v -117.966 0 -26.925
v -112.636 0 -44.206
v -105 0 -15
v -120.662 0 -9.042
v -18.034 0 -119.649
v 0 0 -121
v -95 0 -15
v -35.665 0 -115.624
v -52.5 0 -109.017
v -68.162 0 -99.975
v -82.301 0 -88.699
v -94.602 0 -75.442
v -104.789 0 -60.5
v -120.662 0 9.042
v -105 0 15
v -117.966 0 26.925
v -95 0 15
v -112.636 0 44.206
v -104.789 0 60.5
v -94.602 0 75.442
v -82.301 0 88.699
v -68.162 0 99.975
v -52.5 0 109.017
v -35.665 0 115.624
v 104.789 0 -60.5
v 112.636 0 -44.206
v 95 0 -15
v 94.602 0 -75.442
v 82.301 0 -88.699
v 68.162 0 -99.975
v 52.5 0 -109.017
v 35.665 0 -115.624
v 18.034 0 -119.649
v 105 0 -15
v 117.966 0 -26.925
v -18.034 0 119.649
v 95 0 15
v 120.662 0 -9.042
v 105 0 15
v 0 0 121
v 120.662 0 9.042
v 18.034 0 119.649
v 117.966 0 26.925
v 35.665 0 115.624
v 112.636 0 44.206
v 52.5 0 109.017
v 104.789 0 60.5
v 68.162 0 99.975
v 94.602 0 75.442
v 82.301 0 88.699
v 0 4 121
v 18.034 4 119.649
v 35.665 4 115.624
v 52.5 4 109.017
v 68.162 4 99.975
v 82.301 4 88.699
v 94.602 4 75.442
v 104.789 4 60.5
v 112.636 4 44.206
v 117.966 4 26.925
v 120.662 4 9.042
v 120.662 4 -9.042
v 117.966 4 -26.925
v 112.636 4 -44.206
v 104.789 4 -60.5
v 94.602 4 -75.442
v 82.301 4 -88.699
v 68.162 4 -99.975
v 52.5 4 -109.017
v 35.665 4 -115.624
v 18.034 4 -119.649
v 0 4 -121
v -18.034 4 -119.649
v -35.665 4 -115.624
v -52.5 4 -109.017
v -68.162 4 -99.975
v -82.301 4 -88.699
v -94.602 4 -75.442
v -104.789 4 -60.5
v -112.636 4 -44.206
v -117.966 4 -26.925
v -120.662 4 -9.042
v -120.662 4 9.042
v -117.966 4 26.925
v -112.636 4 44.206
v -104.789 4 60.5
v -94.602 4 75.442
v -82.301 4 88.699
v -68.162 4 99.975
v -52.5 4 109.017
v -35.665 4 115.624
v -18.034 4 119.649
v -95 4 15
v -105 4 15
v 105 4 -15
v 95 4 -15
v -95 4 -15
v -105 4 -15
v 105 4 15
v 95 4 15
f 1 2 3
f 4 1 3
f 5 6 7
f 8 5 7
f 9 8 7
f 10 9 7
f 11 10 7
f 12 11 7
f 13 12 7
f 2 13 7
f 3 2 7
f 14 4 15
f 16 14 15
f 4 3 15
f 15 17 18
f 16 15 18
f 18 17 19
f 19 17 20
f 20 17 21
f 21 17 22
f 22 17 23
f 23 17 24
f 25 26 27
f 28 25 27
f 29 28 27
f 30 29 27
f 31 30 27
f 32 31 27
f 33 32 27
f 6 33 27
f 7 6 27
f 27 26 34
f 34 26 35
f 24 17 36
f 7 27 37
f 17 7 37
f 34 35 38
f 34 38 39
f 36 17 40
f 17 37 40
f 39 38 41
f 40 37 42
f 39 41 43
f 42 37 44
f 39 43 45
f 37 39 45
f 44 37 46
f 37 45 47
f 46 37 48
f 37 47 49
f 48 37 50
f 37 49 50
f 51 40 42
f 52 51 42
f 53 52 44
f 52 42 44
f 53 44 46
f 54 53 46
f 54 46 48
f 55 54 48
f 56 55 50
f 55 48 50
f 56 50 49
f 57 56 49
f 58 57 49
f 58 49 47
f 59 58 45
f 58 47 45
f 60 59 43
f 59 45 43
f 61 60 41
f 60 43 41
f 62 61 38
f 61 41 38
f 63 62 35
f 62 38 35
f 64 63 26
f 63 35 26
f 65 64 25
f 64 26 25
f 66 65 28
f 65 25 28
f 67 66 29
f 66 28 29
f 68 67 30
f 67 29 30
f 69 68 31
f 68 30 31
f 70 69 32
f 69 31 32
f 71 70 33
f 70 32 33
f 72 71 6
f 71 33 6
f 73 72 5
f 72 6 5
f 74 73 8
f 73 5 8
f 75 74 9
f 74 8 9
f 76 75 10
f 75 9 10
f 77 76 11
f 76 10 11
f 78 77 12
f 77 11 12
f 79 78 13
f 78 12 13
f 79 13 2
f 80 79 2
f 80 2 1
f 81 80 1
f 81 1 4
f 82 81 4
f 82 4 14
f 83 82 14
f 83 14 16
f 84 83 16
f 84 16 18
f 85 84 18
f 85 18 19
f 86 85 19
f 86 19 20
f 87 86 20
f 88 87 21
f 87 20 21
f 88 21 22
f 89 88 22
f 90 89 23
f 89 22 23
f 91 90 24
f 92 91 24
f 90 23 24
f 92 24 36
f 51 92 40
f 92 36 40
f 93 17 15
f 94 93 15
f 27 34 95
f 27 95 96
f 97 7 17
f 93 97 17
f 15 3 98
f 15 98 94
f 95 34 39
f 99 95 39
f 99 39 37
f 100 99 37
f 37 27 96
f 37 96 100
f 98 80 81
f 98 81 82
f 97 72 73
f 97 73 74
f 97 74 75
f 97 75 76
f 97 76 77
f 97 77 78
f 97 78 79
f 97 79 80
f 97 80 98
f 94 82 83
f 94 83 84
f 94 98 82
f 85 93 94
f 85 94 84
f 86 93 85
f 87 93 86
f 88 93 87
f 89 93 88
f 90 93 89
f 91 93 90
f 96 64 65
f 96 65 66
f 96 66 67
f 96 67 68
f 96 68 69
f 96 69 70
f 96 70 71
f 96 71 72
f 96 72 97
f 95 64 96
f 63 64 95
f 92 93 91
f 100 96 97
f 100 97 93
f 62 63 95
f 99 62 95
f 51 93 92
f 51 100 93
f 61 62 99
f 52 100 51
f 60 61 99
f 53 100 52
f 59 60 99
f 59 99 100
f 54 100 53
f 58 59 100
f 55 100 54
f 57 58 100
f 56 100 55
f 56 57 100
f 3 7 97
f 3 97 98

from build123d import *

# Parameters (mm, degrees)
BOTTOM_R             = 121
BOTTOM_W             = 10
BOTTOM_H             = 30
BOTTOM_EXTRUDE_DEPTH = 4


with BuildPart() as part:
    # Bottom → Bottom-Extrude (new body)
    with BuildSketch(Plane(origin=(0, 0, 0), x_dir=(-1, 0, 0), z_dir=(0, 1, 0))):
        with Locations(Location((0, 0, 0), (0, 0, 90))):
            Circle(BOTTOM_R)
        with Locations((100, 0)):
            Rectangle(BOTTOM_W, BOTTOM_H, mode=Mode.SUBTRACT)
        with Locations((-100, 0)):
            Rectangle(BOTTOM_W, BOTTOM_H, mode=Mode.SUBTRACT)
    extrude(amount=BOTTOM_EXTRUDE_DEPTH)


solid = part.part
